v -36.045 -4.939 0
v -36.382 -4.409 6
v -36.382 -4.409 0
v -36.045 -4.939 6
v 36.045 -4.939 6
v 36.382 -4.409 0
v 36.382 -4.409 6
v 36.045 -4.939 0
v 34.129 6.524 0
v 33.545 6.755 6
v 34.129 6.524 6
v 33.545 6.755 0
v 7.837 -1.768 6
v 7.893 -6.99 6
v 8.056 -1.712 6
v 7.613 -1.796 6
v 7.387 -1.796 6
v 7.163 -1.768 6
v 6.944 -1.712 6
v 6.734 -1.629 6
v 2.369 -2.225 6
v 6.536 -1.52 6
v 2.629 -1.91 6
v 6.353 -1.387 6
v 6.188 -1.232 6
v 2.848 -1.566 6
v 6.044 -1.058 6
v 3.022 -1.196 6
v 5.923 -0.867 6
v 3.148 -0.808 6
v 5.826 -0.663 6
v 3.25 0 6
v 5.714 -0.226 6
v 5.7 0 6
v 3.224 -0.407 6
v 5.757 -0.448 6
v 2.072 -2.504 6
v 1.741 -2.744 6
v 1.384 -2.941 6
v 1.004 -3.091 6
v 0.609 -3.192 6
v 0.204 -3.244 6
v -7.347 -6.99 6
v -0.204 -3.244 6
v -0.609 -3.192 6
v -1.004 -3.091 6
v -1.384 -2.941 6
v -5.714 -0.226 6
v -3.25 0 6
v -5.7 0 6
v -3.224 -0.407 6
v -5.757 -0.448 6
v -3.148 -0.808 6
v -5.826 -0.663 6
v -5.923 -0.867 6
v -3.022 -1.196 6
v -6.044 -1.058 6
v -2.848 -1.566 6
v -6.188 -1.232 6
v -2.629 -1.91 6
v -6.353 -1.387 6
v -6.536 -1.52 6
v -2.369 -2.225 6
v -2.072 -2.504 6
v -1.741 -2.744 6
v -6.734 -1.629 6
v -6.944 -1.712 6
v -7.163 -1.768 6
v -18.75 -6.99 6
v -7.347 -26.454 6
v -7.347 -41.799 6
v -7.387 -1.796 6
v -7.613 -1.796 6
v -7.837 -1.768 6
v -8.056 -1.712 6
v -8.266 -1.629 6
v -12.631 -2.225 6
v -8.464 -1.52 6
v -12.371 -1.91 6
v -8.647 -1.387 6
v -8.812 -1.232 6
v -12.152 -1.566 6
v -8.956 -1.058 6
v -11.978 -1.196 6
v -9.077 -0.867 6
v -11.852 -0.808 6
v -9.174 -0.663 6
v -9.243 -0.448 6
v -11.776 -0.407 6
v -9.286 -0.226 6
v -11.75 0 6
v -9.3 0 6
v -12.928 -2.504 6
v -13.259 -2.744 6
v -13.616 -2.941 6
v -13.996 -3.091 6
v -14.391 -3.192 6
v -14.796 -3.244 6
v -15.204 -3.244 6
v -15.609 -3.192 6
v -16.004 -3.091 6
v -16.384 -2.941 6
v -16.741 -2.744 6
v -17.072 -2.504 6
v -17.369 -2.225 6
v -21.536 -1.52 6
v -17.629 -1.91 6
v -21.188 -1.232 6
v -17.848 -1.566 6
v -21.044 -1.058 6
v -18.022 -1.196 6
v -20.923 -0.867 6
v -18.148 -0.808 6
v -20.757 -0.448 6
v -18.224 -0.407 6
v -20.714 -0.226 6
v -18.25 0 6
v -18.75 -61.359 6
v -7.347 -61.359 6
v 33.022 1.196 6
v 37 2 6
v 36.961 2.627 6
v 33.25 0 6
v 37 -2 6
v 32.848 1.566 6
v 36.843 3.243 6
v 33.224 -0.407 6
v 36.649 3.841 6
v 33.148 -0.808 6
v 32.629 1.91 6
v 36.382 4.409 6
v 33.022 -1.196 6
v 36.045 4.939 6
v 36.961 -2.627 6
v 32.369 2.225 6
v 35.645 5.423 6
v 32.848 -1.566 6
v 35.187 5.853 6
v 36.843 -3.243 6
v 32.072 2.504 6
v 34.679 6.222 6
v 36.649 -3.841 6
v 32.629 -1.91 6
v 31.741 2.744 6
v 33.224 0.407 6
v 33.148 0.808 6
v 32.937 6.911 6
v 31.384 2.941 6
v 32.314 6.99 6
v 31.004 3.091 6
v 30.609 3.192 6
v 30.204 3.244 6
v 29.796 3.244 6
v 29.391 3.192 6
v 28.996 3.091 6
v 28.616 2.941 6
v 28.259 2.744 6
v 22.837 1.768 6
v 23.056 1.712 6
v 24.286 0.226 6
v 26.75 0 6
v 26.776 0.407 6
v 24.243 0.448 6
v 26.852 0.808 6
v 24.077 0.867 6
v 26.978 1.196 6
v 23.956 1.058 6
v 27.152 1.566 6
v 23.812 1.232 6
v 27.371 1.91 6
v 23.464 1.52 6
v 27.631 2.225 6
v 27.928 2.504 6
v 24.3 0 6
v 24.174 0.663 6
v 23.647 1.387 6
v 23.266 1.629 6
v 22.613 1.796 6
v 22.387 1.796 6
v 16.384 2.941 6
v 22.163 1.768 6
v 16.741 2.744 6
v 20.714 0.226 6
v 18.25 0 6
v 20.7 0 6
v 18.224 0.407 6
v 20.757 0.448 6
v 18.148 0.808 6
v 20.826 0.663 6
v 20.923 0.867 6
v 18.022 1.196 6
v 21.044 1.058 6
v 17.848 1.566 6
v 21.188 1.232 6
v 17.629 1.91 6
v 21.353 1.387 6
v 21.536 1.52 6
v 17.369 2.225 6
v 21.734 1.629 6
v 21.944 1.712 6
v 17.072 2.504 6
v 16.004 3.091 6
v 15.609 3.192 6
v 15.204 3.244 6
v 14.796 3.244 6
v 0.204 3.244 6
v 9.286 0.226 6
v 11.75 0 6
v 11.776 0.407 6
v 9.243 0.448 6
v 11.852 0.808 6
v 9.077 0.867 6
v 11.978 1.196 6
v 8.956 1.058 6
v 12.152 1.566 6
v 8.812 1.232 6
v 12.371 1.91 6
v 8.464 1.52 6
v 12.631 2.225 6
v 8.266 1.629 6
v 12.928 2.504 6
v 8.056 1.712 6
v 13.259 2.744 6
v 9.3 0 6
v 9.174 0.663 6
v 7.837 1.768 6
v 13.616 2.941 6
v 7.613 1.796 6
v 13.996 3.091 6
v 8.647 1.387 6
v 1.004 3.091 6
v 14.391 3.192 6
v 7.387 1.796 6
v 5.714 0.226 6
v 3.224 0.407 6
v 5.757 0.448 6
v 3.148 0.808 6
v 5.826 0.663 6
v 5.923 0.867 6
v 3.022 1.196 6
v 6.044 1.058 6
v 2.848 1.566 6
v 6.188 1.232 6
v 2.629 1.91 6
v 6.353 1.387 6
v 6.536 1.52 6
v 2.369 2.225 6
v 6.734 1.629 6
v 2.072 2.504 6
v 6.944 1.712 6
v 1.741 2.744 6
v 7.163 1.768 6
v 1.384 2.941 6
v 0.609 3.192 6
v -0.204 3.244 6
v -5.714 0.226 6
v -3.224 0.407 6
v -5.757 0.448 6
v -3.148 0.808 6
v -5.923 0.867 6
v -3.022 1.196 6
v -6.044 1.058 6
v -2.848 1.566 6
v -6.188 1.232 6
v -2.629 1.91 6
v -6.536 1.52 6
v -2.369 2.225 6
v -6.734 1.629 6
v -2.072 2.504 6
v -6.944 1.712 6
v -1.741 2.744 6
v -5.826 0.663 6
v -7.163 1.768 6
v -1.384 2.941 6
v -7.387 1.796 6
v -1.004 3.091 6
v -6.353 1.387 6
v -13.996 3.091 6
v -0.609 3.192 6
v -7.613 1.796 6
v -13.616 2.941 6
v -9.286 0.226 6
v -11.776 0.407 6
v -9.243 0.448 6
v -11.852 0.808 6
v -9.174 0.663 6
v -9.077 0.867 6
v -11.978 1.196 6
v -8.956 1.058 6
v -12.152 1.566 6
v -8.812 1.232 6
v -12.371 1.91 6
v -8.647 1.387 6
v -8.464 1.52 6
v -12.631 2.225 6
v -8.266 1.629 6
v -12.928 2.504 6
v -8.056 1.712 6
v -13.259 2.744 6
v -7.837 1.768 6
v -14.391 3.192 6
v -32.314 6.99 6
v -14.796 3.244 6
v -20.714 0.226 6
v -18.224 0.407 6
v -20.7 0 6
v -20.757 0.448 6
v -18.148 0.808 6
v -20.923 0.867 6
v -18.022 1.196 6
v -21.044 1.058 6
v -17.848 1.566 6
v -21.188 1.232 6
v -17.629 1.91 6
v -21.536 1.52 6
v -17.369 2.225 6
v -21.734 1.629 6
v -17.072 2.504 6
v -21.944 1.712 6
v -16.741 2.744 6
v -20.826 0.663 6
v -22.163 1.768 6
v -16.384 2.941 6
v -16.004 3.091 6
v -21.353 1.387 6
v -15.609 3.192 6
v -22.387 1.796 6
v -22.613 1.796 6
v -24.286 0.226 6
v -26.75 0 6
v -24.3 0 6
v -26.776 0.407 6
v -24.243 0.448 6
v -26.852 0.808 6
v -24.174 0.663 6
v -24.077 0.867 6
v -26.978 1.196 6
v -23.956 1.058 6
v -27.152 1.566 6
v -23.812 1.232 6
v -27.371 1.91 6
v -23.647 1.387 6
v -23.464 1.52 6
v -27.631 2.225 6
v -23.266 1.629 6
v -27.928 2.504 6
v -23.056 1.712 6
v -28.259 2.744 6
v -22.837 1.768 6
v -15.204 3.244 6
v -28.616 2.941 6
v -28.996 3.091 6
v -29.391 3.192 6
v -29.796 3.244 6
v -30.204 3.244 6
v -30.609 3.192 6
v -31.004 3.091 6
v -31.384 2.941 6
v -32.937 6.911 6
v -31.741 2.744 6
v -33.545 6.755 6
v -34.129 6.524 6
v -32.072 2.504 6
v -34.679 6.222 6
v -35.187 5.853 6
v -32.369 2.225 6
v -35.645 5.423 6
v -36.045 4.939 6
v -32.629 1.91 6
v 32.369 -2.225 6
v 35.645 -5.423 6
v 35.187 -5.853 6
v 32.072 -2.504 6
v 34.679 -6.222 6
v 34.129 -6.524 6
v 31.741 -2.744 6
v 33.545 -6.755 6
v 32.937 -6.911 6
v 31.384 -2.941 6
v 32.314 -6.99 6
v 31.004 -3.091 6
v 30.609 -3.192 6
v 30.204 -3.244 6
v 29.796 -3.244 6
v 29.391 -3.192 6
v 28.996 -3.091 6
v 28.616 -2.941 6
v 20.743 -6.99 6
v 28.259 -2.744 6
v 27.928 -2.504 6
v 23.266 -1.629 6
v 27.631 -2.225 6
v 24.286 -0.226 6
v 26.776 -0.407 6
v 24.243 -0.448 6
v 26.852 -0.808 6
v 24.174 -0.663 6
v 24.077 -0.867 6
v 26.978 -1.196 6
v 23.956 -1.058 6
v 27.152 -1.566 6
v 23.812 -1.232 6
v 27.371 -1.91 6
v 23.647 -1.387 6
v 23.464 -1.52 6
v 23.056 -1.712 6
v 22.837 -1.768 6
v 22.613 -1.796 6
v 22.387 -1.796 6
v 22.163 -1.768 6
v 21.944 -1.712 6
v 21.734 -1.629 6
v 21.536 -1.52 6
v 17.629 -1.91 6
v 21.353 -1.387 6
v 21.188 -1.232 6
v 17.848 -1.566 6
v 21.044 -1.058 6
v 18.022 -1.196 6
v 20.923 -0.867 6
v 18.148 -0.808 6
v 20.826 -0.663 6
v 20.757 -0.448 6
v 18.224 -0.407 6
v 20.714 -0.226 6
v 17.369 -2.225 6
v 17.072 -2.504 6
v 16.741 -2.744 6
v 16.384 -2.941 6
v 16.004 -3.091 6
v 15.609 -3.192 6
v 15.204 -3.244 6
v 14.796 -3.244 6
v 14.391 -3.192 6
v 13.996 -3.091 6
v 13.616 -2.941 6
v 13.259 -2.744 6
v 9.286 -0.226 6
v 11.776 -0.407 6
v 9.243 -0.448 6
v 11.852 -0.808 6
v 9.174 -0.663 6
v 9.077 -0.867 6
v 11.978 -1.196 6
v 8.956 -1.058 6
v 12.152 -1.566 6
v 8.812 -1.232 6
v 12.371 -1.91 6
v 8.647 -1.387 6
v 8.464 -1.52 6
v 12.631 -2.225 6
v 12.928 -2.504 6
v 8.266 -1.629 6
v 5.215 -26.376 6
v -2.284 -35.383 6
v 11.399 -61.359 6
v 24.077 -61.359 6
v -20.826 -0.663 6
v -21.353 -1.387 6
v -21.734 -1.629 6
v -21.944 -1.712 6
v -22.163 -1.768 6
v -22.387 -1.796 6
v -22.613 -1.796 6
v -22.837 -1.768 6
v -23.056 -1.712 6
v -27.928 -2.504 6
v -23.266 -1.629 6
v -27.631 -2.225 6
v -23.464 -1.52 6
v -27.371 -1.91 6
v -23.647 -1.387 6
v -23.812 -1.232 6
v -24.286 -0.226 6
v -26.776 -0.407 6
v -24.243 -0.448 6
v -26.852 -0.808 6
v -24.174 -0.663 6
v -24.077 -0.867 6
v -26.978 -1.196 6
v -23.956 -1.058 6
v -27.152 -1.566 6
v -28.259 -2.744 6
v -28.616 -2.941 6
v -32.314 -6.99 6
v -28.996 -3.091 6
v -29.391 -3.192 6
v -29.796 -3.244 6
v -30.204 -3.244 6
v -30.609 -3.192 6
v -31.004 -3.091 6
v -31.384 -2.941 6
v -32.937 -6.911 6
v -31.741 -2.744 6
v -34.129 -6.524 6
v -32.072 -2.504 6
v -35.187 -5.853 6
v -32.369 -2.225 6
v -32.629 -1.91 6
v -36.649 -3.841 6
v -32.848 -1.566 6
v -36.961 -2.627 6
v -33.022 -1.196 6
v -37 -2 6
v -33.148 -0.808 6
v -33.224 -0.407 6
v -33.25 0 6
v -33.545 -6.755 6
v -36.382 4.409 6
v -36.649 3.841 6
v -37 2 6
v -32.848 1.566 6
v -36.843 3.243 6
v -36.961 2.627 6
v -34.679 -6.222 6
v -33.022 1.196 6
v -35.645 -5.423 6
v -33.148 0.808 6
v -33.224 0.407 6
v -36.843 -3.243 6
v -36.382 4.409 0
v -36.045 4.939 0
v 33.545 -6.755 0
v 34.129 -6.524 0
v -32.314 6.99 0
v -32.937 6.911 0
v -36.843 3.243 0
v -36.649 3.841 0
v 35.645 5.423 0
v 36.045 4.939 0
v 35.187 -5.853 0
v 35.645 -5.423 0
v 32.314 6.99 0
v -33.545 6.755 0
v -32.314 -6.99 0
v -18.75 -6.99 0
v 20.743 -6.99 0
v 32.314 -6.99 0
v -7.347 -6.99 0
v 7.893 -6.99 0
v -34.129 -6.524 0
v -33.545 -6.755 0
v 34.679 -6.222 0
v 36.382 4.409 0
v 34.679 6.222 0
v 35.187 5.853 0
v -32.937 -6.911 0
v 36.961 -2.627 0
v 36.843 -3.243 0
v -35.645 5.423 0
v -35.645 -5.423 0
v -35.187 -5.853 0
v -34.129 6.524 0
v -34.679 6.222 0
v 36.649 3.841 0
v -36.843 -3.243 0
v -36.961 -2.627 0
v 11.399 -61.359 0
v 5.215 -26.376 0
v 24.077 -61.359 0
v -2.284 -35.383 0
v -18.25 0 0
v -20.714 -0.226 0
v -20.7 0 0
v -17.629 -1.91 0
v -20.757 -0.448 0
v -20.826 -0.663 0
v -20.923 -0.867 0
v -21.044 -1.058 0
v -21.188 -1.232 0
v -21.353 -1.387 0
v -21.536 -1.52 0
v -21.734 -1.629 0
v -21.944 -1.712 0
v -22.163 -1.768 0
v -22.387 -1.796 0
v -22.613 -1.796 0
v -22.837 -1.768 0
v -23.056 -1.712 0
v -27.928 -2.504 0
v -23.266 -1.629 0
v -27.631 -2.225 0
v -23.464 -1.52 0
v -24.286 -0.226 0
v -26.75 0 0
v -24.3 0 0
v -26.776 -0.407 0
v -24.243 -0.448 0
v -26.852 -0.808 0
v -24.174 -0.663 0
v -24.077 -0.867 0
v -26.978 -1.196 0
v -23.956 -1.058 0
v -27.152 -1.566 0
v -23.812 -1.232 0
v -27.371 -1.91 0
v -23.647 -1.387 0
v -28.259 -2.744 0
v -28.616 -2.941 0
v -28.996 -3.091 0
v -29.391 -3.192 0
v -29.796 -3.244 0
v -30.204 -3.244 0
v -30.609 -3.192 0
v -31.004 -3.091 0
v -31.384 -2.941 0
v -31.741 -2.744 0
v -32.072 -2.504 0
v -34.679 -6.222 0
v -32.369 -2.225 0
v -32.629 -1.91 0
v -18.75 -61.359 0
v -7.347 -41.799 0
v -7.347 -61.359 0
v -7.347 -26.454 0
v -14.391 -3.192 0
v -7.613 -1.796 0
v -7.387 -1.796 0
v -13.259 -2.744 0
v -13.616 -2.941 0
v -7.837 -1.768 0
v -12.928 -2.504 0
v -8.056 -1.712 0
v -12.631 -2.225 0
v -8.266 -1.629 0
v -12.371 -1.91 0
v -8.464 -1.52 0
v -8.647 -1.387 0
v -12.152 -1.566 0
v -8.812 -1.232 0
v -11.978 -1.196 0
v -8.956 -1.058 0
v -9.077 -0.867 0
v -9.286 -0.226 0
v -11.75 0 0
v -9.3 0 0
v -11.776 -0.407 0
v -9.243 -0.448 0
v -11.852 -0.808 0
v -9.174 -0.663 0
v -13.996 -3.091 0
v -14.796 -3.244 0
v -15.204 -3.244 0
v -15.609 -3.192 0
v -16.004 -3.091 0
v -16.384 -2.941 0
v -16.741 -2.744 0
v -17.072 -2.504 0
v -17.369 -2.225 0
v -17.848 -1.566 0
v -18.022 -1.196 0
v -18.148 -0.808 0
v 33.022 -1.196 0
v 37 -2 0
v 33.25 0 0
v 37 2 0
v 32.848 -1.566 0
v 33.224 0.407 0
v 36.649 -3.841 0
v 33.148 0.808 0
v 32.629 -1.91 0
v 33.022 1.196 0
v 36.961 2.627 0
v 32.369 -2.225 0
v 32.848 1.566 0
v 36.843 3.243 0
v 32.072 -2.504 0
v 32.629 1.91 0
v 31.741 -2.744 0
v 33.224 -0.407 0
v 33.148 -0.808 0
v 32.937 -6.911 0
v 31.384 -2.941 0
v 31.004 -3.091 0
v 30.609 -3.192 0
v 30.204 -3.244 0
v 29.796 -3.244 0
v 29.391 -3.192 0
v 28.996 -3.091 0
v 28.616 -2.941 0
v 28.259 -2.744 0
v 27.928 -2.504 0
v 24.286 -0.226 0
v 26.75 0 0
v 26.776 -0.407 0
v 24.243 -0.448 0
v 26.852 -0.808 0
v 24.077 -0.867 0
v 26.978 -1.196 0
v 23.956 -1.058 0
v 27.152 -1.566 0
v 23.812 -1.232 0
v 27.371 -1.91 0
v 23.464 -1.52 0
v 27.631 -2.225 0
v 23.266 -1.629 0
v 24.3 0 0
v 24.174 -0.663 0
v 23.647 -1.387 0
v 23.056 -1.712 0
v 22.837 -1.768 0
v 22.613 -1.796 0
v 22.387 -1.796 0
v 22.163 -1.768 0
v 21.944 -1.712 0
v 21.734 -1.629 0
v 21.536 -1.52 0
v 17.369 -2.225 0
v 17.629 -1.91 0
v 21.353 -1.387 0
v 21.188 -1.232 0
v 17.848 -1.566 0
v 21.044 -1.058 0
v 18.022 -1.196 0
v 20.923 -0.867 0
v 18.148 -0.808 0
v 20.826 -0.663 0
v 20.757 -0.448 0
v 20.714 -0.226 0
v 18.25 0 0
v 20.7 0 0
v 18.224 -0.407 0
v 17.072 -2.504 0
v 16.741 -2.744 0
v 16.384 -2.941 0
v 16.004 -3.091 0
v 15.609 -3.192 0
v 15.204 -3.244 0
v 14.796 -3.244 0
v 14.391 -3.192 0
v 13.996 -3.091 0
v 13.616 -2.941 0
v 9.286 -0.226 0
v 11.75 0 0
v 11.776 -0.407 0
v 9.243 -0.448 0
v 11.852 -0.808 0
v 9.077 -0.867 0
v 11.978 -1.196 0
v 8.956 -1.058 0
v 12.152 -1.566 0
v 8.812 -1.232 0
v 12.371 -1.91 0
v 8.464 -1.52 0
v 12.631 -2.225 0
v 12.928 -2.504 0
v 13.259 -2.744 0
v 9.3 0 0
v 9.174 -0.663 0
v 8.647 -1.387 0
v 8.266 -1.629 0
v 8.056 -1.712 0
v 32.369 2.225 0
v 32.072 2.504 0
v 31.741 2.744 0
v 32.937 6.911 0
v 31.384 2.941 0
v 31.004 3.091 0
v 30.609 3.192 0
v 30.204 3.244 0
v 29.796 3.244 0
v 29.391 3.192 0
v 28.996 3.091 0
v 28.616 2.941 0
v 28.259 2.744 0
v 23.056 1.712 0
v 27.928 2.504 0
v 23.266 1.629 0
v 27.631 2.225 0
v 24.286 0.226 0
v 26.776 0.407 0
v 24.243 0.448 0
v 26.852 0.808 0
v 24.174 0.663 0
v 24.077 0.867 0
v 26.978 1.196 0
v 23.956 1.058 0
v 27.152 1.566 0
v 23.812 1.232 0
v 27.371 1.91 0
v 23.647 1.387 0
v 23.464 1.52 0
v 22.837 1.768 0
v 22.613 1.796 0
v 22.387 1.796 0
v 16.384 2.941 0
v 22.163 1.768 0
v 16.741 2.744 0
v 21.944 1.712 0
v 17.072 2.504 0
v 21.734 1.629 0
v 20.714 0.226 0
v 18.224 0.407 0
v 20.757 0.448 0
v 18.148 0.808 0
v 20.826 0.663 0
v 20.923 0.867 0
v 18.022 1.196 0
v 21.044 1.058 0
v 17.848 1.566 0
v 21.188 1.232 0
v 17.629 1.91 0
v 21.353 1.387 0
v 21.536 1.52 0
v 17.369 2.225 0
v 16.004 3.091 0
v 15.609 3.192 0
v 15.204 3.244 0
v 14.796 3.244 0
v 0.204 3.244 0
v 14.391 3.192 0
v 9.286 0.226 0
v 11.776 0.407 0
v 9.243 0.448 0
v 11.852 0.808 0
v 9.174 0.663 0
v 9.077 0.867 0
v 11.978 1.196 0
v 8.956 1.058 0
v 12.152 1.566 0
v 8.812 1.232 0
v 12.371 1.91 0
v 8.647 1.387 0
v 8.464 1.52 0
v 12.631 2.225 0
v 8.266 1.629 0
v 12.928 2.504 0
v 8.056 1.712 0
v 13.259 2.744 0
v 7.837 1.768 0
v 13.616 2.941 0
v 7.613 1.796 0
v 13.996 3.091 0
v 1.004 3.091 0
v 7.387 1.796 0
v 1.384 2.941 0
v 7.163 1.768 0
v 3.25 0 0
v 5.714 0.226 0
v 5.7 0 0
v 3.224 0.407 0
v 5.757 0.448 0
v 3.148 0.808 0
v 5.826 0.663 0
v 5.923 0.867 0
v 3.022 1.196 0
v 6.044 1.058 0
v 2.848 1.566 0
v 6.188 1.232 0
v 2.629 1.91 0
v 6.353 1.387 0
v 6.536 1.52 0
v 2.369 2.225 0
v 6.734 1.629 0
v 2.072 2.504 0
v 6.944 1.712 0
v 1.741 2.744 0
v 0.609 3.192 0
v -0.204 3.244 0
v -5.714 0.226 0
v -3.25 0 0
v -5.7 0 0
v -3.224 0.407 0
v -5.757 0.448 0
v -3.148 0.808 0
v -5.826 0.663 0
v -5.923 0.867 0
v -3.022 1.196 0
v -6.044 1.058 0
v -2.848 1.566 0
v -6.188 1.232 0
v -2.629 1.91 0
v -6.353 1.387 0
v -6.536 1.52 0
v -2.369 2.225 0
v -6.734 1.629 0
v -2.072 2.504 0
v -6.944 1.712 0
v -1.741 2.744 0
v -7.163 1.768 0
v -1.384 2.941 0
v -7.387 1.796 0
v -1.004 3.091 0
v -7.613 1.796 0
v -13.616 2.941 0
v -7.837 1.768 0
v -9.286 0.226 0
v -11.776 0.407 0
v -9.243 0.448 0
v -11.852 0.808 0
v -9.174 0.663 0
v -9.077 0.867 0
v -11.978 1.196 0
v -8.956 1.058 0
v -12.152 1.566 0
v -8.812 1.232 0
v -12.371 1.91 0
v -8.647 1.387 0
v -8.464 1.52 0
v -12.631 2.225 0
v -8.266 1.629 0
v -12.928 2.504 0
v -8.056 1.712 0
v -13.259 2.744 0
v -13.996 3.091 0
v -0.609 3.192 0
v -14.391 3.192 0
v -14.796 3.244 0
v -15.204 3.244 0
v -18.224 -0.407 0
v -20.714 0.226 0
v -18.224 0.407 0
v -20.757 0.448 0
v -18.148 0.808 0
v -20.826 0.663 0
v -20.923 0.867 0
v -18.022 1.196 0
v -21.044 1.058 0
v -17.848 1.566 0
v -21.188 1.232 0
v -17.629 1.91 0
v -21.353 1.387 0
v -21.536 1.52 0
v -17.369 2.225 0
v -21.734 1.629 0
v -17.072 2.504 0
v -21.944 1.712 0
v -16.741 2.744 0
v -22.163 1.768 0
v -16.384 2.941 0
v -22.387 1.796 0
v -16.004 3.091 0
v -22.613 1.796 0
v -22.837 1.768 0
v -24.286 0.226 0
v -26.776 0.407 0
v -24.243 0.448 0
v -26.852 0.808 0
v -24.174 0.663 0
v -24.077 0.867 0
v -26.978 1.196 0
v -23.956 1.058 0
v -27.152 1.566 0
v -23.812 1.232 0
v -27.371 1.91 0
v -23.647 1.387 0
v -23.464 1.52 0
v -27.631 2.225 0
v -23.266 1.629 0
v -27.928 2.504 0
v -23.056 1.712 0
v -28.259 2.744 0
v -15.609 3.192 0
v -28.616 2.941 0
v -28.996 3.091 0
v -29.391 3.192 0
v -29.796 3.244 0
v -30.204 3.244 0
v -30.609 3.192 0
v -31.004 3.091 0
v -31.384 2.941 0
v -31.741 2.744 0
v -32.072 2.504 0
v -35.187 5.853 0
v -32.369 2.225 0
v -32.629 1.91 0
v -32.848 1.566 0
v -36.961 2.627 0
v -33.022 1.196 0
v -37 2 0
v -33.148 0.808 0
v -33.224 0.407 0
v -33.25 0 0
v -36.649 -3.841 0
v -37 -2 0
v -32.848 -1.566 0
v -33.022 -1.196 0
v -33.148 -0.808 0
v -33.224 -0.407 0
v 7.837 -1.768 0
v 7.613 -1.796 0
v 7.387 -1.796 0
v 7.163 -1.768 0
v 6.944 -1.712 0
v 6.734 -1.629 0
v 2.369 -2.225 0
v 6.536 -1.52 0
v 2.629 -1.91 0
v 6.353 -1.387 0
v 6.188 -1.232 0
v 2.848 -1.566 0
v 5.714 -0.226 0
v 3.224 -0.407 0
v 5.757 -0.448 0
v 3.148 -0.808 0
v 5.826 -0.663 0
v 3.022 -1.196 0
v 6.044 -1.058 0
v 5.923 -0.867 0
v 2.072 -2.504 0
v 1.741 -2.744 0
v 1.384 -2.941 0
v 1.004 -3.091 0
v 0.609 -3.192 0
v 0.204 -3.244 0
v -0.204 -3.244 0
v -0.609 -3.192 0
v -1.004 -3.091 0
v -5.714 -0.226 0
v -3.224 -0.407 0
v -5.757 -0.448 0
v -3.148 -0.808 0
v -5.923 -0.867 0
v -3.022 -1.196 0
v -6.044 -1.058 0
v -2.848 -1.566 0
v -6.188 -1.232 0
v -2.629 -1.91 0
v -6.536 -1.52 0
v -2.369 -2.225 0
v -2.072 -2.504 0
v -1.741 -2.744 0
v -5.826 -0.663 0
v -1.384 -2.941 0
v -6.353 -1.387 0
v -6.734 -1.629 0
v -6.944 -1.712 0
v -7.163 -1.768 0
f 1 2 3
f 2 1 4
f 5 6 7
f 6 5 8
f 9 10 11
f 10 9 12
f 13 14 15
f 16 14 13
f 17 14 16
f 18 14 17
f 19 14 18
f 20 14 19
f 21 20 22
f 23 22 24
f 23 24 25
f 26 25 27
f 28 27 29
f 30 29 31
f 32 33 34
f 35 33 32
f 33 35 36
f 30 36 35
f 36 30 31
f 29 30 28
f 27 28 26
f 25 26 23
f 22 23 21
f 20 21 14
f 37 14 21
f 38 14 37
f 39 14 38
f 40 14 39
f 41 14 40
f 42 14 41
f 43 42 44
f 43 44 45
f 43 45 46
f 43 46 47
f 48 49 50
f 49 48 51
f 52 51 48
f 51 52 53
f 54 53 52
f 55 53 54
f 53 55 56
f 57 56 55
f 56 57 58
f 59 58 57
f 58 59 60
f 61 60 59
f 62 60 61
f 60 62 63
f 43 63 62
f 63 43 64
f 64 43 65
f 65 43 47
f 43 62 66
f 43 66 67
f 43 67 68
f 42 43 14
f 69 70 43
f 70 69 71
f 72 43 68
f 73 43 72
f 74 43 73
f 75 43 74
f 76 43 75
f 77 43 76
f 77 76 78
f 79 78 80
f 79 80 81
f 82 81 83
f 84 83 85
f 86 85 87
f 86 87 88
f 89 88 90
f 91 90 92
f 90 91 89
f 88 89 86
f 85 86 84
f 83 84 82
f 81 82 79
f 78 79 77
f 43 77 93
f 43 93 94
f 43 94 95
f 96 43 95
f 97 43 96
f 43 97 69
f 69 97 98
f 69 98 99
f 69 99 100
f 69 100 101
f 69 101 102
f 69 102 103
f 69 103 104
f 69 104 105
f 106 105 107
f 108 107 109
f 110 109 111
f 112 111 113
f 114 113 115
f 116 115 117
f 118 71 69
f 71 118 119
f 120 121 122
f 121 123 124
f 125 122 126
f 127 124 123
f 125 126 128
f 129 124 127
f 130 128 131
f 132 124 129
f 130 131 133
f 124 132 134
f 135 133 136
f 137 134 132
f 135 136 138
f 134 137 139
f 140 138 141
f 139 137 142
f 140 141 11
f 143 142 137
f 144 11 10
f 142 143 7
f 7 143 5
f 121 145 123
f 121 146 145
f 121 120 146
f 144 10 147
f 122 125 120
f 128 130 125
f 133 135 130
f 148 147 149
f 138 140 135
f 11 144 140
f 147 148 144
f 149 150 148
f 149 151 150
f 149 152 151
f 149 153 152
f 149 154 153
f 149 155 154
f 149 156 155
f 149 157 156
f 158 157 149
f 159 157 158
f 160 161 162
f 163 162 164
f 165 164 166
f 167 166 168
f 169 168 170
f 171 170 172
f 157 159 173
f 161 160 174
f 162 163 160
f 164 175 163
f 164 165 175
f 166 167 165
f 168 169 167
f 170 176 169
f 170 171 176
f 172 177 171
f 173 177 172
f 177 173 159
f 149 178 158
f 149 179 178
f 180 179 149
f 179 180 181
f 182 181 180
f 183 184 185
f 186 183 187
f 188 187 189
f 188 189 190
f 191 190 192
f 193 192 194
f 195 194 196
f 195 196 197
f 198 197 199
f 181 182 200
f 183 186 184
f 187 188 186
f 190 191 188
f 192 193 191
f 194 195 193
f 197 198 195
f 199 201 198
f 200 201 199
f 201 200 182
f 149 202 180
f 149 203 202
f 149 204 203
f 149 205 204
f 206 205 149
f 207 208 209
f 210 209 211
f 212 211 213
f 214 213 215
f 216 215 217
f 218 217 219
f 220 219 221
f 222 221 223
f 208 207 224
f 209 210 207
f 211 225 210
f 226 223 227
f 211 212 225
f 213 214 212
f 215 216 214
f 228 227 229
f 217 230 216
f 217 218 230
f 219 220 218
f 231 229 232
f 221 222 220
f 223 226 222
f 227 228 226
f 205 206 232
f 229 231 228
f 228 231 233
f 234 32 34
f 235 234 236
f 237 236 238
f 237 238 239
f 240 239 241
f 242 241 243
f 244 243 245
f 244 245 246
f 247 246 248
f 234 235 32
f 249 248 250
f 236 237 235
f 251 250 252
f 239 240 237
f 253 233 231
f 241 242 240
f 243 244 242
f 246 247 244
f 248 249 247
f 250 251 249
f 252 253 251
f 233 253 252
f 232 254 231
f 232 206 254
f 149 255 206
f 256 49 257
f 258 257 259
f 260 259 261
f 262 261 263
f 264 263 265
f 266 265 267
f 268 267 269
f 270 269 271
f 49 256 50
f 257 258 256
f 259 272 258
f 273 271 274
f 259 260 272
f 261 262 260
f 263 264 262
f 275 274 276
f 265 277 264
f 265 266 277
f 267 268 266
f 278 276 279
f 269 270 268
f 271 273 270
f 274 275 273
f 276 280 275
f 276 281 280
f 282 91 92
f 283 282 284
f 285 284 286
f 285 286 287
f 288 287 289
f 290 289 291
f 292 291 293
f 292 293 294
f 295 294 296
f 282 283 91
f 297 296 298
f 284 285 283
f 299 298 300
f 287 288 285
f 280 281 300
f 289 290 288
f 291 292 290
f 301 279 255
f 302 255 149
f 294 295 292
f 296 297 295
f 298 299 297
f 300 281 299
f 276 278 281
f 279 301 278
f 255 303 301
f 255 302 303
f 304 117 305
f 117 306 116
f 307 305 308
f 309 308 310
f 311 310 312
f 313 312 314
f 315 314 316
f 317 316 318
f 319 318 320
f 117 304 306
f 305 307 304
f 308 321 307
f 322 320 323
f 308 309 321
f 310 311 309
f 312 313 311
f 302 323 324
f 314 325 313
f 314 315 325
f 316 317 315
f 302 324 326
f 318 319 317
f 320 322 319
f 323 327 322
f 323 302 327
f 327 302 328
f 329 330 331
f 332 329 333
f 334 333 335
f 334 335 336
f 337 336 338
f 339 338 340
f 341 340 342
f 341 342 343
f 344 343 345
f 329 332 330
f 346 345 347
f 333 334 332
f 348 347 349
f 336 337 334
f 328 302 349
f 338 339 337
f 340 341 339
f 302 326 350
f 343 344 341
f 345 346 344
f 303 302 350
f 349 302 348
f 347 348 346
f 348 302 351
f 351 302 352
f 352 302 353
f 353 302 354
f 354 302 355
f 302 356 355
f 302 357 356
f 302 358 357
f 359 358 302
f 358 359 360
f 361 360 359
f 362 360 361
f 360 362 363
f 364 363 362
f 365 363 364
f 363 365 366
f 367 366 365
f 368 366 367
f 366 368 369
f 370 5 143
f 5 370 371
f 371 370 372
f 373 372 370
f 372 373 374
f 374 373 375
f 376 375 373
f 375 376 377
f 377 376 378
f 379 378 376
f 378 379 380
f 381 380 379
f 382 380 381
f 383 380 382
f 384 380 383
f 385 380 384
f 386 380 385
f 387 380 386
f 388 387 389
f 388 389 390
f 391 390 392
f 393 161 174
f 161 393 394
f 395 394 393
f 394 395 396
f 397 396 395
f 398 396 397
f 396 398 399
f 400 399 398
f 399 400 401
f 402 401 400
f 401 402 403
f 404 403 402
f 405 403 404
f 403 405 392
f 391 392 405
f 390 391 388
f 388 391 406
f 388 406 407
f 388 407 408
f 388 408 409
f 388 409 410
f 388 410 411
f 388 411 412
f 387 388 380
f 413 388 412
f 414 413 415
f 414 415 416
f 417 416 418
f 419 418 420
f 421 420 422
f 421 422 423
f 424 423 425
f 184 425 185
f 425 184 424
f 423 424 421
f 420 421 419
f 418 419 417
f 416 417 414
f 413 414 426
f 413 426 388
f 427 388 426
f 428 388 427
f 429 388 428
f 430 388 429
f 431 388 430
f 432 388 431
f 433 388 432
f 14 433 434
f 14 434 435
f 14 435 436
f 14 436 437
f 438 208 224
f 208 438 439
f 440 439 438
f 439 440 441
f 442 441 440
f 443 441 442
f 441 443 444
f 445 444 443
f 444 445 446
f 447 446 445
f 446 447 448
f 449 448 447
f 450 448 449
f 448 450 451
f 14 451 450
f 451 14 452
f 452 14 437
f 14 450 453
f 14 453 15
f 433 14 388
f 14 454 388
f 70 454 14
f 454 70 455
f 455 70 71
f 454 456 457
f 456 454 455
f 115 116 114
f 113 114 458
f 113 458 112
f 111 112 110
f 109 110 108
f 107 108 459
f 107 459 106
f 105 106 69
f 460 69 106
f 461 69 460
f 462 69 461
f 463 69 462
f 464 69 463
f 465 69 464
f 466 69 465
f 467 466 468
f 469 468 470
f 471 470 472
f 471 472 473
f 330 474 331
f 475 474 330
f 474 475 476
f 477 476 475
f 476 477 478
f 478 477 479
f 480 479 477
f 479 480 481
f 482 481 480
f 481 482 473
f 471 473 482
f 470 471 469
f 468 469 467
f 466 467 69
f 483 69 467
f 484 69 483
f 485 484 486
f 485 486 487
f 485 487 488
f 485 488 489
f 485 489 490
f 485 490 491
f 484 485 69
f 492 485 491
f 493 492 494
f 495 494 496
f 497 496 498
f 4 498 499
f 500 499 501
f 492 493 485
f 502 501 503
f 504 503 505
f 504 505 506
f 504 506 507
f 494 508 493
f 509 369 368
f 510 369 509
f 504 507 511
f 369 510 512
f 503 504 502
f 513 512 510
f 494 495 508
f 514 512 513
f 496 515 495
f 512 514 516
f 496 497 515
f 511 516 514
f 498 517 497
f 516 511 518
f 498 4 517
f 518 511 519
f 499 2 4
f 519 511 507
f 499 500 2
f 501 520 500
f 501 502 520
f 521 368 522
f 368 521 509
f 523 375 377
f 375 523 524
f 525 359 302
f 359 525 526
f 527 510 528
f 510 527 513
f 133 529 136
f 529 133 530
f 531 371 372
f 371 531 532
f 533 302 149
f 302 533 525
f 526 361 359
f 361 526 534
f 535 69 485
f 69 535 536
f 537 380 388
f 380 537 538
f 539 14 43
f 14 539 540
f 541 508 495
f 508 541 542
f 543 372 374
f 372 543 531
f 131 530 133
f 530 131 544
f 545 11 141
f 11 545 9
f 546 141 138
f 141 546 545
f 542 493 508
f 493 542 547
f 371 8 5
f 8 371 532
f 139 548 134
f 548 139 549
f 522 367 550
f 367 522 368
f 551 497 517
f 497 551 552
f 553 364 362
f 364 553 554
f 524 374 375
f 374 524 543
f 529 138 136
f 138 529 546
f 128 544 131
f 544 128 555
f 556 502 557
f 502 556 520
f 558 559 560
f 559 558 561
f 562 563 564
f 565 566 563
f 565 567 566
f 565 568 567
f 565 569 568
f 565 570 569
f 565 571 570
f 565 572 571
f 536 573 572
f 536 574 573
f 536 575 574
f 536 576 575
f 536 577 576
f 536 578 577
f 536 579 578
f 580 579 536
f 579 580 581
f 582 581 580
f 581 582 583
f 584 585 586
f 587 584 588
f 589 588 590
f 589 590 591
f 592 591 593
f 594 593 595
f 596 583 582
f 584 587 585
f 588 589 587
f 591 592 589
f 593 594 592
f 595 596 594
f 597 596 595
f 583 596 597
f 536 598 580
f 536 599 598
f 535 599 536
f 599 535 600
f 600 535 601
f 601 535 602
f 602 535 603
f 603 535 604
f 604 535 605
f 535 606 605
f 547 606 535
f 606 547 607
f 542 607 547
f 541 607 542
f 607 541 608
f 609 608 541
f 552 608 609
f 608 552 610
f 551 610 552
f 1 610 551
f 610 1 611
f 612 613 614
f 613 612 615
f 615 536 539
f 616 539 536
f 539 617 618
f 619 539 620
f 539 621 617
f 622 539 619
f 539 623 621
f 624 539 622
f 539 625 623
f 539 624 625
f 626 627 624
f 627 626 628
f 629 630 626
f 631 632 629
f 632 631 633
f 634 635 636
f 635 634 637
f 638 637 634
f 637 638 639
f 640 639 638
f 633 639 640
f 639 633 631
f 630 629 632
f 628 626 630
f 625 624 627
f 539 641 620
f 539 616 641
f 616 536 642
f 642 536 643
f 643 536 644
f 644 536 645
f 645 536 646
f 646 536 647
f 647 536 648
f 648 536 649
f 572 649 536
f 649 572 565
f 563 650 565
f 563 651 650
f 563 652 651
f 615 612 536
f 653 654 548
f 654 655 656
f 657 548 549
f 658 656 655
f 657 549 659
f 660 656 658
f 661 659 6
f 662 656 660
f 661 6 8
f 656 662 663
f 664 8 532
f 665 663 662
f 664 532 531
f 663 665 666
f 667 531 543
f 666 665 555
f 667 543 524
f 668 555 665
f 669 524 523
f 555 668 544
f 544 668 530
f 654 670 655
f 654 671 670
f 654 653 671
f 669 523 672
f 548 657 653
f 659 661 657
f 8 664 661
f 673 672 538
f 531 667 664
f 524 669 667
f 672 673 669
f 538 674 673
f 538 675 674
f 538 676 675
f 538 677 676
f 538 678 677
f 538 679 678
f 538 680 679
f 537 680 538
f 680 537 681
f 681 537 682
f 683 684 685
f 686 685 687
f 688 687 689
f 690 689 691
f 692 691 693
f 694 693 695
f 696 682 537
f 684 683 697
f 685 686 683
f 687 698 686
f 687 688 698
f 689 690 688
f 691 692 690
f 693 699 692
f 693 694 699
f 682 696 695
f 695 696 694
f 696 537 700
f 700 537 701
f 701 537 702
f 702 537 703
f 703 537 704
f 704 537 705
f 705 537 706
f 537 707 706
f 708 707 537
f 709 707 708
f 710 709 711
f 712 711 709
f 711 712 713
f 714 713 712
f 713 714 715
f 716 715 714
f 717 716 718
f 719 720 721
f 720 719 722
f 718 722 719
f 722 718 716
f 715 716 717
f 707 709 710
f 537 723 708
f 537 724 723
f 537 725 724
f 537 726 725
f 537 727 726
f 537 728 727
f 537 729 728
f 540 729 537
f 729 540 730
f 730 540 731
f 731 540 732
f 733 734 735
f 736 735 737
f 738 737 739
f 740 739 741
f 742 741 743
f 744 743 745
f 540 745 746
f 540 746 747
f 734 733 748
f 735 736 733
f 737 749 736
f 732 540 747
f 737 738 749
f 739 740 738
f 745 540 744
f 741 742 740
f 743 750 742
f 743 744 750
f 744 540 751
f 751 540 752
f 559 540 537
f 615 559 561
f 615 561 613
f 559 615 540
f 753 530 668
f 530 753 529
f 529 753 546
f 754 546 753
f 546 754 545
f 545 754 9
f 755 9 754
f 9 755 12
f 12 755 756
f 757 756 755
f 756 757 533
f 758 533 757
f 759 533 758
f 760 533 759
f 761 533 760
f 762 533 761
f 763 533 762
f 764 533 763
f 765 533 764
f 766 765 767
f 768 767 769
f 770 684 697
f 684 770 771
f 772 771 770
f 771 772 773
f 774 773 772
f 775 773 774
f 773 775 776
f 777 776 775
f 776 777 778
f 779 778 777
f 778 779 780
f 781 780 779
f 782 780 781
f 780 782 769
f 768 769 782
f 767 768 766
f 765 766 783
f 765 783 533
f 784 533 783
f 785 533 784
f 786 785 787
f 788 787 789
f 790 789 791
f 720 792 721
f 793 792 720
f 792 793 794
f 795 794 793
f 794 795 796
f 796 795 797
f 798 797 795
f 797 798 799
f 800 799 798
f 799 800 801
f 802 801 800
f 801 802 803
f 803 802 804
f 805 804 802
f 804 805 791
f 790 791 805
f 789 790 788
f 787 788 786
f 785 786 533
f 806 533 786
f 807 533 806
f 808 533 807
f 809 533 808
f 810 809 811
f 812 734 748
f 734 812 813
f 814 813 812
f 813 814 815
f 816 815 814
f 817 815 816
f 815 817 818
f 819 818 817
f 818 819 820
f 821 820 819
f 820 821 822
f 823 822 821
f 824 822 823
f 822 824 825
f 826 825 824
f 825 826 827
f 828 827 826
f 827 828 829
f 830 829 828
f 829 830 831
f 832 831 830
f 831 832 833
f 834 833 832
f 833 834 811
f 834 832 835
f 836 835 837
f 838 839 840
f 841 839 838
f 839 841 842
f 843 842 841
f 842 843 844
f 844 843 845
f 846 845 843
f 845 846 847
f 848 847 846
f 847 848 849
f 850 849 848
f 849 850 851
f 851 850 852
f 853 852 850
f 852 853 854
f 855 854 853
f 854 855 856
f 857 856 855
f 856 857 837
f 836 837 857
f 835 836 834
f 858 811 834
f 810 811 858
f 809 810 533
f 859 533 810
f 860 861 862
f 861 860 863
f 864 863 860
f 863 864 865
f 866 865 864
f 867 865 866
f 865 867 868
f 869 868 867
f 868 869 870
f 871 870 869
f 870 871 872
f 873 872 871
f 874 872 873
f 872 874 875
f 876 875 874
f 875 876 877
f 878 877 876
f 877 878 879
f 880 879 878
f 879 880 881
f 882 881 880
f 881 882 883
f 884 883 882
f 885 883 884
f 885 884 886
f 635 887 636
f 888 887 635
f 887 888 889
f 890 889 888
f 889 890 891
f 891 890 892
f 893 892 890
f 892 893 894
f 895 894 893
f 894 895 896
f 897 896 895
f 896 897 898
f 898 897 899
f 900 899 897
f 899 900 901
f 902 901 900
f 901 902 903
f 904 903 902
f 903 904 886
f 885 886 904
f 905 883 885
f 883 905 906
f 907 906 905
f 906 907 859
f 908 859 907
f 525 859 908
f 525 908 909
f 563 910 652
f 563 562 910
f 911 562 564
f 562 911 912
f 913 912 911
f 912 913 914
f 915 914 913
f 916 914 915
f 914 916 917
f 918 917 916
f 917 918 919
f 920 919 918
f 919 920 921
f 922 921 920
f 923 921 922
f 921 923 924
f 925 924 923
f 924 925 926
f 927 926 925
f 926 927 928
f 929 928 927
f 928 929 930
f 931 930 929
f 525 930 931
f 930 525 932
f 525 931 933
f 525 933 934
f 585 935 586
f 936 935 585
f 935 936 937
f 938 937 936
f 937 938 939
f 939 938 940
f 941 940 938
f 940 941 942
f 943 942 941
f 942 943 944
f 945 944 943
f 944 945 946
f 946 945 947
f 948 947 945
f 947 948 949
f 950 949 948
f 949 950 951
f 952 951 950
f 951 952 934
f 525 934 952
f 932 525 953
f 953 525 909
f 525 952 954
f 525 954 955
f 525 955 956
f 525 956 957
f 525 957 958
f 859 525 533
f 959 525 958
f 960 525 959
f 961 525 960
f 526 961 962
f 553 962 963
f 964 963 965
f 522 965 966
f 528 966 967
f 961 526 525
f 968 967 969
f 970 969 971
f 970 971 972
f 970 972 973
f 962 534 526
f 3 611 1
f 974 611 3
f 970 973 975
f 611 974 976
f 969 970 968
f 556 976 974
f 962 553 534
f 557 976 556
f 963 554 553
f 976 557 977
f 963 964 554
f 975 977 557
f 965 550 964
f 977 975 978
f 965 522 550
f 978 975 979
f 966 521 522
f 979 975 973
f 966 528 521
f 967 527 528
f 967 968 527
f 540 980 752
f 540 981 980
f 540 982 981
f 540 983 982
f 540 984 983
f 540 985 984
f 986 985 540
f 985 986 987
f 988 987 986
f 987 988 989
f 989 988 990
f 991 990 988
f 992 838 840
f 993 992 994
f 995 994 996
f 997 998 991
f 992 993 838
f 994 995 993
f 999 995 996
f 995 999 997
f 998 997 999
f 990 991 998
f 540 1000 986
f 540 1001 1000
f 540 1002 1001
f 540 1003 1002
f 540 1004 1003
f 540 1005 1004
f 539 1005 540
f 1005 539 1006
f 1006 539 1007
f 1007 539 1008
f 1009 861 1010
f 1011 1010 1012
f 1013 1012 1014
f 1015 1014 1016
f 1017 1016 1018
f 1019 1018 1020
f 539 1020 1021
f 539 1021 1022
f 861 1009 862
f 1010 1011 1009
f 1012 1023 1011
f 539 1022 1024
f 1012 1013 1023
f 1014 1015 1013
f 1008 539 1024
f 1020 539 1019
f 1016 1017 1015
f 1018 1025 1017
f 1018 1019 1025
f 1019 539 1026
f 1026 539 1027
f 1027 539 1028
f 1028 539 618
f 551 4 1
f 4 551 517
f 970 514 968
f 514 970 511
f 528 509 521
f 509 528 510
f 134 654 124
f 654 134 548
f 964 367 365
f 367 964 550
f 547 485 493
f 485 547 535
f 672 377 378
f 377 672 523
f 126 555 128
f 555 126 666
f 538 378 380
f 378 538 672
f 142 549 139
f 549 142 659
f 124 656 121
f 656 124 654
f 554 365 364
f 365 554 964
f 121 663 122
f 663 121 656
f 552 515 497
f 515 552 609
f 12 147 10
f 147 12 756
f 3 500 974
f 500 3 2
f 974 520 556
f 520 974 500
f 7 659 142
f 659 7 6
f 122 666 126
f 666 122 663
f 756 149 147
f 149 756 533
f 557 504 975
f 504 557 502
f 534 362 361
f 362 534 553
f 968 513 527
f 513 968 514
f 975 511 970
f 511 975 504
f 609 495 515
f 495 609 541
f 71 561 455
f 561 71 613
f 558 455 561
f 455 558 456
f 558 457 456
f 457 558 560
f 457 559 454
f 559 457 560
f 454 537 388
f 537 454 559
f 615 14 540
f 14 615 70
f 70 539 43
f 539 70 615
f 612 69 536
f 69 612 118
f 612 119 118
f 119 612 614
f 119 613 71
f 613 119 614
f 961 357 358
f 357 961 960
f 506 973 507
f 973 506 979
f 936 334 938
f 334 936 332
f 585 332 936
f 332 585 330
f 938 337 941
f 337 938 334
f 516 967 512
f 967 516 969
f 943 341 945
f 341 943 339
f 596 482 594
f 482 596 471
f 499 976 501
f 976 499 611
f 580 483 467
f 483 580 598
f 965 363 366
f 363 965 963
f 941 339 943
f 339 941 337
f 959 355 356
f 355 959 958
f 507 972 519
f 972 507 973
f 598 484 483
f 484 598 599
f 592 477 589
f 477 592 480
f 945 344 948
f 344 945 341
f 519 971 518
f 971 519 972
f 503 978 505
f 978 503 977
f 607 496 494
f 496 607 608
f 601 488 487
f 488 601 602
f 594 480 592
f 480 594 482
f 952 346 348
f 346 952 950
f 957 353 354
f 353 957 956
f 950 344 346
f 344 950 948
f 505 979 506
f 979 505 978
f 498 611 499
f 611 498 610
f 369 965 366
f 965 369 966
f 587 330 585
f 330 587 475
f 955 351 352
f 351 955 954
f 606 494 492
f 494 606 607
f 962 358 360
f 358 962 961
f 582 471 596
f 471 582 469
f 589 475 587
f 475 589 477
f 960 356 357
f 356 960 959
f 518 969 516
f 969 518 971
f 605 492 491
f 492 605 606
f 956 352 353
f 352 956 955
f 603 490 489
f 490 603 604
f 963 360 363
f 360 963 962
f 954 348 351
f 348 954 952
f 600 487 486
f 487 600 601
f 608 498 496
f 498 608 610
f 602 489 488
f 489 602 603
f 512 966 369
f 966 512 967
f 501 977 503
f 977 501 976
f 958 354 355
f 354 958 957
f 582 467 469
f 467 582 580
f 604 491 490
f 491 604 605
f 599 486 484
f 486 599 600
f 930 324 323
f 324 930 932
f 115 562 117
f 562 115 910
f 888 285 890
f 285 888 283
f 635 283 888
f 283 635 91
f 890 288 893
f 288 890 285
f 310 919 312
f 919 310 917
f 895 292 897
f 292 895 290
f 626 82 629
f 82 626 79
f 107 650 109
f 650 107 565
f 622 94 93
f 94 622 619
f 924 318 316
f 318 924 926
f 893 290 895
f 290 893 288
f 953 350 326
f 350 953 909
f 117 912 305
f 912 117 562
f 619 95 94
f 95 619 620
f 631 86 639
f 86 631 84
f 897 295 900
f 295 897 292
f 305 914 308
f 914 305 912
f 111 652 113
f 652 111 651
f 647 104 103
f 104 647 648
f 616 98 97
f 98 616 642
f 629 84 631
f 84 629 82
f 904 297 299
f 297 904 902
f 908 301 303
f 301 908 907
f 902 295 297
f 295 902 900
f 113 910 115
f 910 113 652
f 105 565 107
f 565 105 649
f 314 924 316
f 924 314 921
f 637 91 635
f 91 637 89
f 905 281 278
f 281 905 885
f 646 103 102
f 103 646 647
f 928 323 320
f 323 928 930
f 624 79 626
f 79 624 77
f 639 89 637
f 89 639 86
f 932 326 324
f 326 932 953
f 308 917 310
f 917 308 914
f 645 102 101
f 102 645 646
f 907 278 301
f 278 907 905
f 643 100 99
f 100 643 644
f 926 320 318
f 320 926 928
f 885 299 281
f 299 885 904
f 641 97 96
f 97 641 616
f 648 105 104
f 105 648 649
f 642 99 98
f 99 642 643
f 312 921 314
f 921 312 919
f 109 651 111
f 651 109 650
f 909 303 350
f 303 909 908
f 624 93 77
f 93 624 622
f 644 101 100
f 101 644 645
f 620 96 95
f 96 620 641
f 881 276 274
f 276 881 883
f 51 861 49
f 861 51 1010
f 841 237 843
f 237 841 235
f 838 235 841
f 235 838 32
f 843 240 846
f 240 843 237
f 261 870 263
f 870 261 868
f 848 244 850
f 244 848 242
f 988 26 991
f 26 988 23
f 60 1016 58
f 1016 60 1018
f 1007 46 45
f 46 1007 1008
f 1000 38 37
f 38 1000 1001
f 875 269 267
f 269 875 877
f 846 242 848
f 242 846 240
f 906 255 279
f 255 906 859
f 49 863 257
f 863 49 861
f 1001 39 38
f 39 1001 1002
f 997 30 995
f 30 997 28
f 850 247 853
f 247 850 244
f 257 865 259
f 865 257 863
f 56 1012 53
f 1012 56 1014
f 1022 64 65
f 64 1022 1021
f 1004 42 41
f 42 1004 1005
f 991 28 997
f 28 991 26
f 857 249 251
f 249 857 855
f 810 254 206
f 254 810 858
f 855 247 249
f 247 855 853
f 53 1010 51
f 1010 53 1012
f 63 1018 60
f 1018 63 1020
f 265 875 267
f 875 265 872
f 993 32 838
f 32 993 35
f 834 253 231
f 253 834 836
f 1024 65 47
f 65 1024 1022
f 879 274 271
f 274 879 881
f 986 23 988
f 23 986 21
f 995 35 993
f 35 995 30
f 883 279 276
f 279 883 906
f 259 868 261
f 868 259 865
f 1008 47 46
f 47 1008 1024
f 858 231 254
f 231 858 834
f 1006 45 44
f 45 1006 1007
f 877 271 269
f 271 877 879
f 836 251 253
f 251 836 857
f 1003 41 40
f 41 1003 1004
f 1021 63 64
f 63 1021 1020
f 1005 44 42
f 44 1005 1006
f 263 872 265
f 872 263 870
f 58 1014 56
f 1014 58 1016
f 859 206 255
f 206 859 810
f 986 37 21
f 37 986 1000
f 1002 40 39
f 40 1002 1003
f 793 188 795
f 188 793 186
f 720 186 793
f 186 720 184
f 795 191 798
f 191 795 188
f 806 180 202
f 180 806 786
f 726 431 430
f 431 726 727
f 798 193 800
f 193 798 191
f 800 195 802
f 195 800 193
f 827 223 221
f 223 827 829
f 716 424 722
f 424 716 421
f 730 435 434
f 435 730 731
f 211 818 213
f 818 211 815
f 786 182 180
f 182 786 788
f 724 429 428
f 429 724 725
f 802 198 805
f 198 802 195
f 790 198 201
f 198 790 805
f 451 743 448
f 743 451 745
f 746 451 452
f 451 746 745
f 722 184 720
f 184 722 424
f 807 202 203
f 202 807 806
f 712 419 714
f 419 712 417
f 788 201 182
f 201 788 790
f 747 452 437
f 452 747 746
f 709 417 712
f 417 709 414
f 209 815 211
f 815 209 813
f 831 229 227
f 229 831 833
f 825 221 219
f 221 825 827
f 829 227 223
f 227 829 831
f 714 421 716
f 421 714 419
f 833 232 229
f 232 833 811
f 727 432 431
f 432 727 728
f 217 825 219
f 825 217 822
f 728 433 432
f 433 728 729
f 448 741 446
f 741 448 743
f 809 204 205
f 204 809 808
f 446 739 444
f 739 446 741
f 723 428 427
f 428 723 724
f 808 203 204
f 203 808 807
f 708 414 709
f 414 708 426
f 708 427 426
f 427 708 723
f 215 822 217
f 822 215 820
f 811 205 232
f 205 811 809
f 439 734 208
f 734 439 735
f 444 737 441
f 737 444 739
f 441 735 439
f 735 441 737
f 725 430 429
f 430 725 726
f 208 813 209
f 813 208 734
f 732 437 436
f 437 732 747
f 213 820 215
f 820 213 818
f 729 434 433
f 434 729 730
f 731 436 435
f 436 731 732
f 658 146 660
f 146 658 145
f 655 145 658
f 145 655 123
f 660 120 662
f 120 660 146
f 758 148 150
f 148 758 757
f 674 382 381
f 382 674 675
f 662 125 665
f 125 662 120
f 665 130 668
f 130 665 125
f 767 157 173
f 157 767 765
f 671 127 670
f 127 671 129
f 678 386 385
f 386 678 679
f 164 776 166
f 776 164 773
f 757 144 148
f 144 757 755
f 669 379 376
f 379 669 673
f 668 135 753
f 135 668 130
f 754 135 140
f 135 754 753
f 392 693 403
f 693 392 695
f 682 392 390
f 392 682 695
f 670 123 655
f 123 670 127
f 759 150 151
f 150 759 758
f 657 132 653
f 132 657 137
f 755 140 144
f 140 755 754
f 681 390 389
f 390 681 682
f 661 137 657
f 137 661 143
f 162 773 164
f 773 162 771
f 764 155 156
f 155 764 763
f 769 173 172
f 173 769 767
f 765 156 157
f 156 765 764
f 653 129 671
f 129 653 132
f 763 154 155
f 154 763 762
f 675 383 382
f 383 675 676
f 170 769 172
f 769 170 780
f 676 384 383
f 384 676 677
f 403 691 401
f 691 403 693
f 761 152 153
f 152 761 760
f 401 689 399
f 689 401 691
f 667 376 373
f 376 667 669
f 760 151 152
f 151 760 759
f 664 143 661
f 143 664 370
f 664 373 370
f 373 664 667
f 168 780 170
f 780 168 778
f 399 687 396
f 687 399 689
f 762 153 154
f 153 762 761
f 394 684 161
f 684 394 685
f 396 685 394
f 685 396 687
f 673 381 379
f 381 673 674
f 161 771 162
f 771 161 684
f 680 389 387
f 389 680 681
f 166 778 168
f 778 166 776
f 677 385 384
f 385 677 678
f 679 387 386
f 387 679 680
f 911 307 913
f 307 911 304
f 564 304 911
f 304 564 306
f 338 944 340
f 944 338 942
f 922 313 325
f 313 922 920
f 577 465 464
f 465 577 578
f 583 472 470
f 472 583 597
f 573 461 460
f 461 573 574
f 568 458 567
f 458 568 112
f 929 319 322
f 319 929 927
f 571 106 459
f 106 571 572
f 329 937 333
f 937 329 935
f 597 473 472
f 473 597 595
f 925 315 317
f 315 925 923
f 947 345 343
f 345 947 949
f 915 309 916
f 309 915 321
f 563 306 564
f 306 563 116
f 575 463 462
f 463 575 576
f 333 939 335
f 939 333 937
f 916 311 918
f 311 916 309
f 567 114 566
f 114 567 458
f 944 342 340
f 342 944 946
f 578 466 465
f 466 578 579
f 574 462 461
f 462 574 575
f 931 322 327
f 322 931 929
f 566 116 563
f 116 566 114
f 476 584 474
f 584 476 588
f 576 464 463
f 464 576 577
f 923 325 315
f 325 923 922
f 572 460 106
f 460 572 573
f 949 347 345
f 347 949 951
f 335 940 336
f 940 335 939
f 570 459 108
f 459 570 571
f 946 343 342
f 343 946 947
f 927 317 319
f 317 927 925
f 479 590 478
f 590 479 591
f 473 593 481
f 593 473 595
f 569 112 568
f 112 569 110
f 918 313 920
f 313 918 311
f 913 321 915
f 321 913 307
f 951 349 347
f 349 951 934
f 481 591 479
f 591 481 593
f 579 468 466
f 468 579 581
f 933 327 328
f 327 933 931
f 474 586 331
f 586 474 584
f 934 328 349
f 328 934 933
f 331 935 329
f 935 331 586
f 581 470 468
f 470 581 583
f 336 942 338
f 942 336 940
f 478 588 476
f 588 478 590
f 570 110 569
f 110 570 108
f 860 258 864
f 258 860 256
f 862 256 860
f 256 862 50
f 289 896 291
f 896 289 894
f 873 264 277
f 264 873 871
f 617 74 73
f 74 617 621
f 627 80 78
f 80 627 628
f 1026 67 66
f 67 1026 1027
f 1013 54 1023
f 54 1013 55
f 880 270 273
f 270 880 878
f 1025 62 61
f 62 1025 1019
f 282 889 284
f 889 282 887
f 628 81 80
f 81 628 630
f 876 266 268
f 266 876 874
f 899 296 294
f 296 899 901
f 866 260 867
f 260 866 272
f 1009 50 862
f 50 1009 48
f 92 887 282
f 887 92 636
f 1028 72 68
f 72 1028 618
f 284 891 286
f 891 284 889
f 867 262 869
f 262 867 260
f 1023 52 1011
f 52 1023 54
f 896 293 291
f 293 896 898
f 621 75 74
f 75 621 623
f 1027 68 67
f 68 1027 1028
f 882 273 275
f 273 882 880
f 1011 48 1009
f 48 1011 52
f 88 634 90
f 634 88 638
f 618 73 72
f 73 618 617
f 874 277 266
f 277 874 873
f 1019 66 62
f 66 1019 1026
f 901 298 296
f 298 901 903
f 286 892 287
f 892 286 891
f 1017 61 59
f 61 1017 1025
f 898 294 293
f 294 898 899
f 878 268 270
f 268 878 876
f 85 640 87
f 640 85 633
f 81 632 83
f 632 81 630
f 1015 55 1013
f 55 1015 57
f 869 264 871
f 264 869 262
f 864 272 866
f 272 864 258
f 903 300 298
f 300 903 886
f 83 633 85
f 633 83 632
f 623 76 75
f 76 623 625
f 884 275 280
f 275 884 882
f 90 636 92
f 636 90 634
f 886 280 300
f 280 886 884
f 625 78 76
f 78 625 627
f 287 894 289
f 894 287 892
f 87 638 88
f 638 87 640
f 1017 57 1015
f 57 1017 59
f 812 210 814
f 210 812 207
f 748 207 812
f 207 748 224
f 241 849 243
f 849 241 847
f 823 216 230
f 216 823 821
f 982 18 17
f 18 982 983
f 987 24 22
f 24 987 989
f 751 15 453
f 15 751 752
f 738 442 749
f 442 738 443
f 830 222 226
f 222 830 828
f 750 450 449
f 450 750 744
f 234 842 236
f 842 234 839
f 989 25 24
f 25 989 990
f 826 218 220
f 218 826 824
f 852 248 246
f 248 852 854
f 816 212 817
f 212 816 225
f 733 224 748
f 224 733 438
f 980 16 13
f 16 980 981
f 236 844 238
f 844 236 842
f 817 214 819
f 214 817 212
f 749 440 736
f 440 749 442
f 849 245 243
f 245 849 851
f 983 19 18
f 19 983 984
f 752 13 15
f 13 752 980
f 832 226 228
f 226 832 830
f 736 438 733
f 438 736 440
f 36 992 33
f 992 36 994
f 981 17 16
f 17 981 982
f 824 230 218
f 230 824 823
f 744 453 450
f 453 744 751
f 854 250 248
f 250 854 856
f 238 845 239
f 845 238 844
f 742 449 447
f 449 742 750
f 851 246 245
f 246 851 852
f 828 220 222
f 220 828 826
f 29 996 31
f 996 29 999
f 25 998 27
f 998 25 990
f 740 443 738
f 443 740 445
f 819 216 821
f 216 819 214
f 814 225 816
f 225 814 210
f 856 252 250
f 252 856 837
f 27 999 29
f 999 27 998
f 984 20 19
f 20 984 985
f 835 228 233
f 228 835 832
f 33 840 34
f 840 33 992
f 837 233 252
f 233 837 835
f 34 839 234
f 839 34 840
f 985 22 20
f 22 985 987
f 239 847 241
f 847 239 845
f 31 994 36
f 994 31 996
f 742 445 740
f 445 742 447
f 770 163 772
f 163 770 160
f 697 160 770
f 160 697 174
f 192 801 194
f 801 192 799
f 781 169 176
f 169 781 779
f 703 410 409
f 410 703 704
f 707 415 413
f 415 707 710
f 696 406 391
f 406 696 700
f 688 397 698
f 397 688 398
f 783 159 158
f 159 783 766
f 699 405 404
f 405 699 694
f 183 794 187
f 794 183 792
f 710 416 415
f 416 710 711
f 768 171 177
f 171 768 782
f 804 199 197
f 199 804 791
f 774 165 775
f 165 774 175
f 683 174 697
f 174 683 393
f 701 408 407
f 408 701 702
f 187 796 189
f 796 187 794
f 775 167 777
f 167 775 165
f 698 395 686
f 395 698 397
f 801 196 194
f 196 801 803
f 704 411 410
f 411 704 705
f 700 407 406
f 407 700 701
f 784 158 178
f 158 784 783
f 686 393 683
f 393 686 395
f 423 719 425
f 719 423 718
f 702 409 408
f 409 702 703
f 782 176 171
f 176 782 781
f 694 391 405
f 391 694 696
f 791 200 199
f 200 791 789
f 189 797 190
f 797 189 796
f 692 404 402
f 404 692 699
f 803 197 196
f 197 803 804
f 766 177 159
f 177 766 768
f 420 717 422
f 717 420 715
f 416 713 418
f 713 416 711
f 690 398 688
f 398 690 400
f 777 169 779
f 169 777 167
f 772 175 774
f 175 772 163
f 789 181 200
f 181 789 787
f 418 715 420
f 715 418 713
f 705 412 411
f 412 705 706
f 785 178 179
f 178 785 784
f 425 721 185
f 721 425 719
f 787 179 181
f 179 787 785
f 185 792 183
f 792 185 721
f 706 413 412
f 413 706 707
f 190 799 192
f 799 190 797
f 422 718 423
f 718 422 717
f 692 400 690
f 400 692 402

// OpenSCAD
$fn = 50;


difference() {
	union() {
		hull() {
			translate(v = [-32.0000000000, 2.0000000000, 0]) {
				cylinder(h = 6, r = 5);
			}
			translate(v = [32.0000000000, 2.0000000000, 0]) {
				cylinder(h = 6, r = 5);
			}
			translate(v = [-32.0000000000, -2.0000000000, 0]) {
				cylinder(h = 6, r = 5);
			}
			translate(v = [32.0000000000, -2.0000000000, 0]) {
				cylinder(h = 6, r = 5);
			}
		}
		translate(v = [0, -5, 0]) {
			linear_extrude(height = 6) {
				text(font = "DejaVu Sans Mono:style=Bold", halign = "center", size = 57.0000000000, text = "K", valign = "top");
			}
		}
	}
	union() {
		translate(v = [-30.0000000000, 0.0000000000, 0]) {
			translate(v = [0, 0, -100]) {
				cylinder(h = 200, r = 3.2500000000);
			}
		}
		translate(v = [-15.0000000000, 0.0000000000, 0]) {
			translate(v = [0, 0, -100]) {
				cylinder(h = 200, r = 3.2500000000);
			}
		}
		translate(v = [0, 0, -100]) {
			cylinder(h = 200, r = 3.2500000000);
		}
		translate(v = [15.0000000000, 0.0000000000, 0]) {
			translate(v = [0, 0, -100]) {
				cylinder(h = 200, r = 3.2500000000);
			}
		}
		translate(v = [30.0000000000, 0.0000000000, 0]) {
			translate(v = [0, 0, -100]) {
				cylinder(h = 200, r = 3.2500000000);
			}
		}
		translate(v = [-30.0000000000, 0.0000000000, 0]) {
			translate(v = [0, 0, -100]) {
				cylinder(h = 200, r = 1.8000000000);
			}
		}
		translate(v = [-22.5000000000, 0.0000000000, 0]) {
			translate(v = [0, 0, -100]) {
				cylinder(h = 200, r = 1.8000000000);
			}
		}
		translate(v = [-15.0000000000, 0.0000000000, 0]) {
			translate(v = [0, 0, -100]) {
				cylinder(h = 200, r = 1.8000000000);
			}
		}
		translate(v = [-7.5000000000, 0.0000000000, 0]) {
			translate(v = [0, 0, -100]) {
				cylinder(h = 200, r = 1.8000000000);
			}
		}
		translate(v = [0, 0, -100]) {
			cylinder(h = 200, r = 1.8000000000);
		}
		translate(v = [7.5000000000, 0.0000000000, 0]) {
			translate(v = [0, 0, -100]) {
				cylinder(h = 200, r = 1.8000000000);
			}
		}
		translate(v = [15.0000000000, 0.0000000000, 0]) {
			translate(v = [0, 0, -100]) {
				cylinder(h = 200, r = 1.8000000000);
			}
		}
		translate(v = [22.5000000000, 0.0000000000, 0]) {
			translate(v = [0, 0, -100]) {
				cylinder(h = 200, r = 1.8000000000);
			}
		}
		translate(v = [30.0000000000, 0.0000000000, 0]) {
			translate(v = [0, 0, -100]) {
				cylinder(h = 200, r = 1.8000000000);
			}
		}
	}
}
